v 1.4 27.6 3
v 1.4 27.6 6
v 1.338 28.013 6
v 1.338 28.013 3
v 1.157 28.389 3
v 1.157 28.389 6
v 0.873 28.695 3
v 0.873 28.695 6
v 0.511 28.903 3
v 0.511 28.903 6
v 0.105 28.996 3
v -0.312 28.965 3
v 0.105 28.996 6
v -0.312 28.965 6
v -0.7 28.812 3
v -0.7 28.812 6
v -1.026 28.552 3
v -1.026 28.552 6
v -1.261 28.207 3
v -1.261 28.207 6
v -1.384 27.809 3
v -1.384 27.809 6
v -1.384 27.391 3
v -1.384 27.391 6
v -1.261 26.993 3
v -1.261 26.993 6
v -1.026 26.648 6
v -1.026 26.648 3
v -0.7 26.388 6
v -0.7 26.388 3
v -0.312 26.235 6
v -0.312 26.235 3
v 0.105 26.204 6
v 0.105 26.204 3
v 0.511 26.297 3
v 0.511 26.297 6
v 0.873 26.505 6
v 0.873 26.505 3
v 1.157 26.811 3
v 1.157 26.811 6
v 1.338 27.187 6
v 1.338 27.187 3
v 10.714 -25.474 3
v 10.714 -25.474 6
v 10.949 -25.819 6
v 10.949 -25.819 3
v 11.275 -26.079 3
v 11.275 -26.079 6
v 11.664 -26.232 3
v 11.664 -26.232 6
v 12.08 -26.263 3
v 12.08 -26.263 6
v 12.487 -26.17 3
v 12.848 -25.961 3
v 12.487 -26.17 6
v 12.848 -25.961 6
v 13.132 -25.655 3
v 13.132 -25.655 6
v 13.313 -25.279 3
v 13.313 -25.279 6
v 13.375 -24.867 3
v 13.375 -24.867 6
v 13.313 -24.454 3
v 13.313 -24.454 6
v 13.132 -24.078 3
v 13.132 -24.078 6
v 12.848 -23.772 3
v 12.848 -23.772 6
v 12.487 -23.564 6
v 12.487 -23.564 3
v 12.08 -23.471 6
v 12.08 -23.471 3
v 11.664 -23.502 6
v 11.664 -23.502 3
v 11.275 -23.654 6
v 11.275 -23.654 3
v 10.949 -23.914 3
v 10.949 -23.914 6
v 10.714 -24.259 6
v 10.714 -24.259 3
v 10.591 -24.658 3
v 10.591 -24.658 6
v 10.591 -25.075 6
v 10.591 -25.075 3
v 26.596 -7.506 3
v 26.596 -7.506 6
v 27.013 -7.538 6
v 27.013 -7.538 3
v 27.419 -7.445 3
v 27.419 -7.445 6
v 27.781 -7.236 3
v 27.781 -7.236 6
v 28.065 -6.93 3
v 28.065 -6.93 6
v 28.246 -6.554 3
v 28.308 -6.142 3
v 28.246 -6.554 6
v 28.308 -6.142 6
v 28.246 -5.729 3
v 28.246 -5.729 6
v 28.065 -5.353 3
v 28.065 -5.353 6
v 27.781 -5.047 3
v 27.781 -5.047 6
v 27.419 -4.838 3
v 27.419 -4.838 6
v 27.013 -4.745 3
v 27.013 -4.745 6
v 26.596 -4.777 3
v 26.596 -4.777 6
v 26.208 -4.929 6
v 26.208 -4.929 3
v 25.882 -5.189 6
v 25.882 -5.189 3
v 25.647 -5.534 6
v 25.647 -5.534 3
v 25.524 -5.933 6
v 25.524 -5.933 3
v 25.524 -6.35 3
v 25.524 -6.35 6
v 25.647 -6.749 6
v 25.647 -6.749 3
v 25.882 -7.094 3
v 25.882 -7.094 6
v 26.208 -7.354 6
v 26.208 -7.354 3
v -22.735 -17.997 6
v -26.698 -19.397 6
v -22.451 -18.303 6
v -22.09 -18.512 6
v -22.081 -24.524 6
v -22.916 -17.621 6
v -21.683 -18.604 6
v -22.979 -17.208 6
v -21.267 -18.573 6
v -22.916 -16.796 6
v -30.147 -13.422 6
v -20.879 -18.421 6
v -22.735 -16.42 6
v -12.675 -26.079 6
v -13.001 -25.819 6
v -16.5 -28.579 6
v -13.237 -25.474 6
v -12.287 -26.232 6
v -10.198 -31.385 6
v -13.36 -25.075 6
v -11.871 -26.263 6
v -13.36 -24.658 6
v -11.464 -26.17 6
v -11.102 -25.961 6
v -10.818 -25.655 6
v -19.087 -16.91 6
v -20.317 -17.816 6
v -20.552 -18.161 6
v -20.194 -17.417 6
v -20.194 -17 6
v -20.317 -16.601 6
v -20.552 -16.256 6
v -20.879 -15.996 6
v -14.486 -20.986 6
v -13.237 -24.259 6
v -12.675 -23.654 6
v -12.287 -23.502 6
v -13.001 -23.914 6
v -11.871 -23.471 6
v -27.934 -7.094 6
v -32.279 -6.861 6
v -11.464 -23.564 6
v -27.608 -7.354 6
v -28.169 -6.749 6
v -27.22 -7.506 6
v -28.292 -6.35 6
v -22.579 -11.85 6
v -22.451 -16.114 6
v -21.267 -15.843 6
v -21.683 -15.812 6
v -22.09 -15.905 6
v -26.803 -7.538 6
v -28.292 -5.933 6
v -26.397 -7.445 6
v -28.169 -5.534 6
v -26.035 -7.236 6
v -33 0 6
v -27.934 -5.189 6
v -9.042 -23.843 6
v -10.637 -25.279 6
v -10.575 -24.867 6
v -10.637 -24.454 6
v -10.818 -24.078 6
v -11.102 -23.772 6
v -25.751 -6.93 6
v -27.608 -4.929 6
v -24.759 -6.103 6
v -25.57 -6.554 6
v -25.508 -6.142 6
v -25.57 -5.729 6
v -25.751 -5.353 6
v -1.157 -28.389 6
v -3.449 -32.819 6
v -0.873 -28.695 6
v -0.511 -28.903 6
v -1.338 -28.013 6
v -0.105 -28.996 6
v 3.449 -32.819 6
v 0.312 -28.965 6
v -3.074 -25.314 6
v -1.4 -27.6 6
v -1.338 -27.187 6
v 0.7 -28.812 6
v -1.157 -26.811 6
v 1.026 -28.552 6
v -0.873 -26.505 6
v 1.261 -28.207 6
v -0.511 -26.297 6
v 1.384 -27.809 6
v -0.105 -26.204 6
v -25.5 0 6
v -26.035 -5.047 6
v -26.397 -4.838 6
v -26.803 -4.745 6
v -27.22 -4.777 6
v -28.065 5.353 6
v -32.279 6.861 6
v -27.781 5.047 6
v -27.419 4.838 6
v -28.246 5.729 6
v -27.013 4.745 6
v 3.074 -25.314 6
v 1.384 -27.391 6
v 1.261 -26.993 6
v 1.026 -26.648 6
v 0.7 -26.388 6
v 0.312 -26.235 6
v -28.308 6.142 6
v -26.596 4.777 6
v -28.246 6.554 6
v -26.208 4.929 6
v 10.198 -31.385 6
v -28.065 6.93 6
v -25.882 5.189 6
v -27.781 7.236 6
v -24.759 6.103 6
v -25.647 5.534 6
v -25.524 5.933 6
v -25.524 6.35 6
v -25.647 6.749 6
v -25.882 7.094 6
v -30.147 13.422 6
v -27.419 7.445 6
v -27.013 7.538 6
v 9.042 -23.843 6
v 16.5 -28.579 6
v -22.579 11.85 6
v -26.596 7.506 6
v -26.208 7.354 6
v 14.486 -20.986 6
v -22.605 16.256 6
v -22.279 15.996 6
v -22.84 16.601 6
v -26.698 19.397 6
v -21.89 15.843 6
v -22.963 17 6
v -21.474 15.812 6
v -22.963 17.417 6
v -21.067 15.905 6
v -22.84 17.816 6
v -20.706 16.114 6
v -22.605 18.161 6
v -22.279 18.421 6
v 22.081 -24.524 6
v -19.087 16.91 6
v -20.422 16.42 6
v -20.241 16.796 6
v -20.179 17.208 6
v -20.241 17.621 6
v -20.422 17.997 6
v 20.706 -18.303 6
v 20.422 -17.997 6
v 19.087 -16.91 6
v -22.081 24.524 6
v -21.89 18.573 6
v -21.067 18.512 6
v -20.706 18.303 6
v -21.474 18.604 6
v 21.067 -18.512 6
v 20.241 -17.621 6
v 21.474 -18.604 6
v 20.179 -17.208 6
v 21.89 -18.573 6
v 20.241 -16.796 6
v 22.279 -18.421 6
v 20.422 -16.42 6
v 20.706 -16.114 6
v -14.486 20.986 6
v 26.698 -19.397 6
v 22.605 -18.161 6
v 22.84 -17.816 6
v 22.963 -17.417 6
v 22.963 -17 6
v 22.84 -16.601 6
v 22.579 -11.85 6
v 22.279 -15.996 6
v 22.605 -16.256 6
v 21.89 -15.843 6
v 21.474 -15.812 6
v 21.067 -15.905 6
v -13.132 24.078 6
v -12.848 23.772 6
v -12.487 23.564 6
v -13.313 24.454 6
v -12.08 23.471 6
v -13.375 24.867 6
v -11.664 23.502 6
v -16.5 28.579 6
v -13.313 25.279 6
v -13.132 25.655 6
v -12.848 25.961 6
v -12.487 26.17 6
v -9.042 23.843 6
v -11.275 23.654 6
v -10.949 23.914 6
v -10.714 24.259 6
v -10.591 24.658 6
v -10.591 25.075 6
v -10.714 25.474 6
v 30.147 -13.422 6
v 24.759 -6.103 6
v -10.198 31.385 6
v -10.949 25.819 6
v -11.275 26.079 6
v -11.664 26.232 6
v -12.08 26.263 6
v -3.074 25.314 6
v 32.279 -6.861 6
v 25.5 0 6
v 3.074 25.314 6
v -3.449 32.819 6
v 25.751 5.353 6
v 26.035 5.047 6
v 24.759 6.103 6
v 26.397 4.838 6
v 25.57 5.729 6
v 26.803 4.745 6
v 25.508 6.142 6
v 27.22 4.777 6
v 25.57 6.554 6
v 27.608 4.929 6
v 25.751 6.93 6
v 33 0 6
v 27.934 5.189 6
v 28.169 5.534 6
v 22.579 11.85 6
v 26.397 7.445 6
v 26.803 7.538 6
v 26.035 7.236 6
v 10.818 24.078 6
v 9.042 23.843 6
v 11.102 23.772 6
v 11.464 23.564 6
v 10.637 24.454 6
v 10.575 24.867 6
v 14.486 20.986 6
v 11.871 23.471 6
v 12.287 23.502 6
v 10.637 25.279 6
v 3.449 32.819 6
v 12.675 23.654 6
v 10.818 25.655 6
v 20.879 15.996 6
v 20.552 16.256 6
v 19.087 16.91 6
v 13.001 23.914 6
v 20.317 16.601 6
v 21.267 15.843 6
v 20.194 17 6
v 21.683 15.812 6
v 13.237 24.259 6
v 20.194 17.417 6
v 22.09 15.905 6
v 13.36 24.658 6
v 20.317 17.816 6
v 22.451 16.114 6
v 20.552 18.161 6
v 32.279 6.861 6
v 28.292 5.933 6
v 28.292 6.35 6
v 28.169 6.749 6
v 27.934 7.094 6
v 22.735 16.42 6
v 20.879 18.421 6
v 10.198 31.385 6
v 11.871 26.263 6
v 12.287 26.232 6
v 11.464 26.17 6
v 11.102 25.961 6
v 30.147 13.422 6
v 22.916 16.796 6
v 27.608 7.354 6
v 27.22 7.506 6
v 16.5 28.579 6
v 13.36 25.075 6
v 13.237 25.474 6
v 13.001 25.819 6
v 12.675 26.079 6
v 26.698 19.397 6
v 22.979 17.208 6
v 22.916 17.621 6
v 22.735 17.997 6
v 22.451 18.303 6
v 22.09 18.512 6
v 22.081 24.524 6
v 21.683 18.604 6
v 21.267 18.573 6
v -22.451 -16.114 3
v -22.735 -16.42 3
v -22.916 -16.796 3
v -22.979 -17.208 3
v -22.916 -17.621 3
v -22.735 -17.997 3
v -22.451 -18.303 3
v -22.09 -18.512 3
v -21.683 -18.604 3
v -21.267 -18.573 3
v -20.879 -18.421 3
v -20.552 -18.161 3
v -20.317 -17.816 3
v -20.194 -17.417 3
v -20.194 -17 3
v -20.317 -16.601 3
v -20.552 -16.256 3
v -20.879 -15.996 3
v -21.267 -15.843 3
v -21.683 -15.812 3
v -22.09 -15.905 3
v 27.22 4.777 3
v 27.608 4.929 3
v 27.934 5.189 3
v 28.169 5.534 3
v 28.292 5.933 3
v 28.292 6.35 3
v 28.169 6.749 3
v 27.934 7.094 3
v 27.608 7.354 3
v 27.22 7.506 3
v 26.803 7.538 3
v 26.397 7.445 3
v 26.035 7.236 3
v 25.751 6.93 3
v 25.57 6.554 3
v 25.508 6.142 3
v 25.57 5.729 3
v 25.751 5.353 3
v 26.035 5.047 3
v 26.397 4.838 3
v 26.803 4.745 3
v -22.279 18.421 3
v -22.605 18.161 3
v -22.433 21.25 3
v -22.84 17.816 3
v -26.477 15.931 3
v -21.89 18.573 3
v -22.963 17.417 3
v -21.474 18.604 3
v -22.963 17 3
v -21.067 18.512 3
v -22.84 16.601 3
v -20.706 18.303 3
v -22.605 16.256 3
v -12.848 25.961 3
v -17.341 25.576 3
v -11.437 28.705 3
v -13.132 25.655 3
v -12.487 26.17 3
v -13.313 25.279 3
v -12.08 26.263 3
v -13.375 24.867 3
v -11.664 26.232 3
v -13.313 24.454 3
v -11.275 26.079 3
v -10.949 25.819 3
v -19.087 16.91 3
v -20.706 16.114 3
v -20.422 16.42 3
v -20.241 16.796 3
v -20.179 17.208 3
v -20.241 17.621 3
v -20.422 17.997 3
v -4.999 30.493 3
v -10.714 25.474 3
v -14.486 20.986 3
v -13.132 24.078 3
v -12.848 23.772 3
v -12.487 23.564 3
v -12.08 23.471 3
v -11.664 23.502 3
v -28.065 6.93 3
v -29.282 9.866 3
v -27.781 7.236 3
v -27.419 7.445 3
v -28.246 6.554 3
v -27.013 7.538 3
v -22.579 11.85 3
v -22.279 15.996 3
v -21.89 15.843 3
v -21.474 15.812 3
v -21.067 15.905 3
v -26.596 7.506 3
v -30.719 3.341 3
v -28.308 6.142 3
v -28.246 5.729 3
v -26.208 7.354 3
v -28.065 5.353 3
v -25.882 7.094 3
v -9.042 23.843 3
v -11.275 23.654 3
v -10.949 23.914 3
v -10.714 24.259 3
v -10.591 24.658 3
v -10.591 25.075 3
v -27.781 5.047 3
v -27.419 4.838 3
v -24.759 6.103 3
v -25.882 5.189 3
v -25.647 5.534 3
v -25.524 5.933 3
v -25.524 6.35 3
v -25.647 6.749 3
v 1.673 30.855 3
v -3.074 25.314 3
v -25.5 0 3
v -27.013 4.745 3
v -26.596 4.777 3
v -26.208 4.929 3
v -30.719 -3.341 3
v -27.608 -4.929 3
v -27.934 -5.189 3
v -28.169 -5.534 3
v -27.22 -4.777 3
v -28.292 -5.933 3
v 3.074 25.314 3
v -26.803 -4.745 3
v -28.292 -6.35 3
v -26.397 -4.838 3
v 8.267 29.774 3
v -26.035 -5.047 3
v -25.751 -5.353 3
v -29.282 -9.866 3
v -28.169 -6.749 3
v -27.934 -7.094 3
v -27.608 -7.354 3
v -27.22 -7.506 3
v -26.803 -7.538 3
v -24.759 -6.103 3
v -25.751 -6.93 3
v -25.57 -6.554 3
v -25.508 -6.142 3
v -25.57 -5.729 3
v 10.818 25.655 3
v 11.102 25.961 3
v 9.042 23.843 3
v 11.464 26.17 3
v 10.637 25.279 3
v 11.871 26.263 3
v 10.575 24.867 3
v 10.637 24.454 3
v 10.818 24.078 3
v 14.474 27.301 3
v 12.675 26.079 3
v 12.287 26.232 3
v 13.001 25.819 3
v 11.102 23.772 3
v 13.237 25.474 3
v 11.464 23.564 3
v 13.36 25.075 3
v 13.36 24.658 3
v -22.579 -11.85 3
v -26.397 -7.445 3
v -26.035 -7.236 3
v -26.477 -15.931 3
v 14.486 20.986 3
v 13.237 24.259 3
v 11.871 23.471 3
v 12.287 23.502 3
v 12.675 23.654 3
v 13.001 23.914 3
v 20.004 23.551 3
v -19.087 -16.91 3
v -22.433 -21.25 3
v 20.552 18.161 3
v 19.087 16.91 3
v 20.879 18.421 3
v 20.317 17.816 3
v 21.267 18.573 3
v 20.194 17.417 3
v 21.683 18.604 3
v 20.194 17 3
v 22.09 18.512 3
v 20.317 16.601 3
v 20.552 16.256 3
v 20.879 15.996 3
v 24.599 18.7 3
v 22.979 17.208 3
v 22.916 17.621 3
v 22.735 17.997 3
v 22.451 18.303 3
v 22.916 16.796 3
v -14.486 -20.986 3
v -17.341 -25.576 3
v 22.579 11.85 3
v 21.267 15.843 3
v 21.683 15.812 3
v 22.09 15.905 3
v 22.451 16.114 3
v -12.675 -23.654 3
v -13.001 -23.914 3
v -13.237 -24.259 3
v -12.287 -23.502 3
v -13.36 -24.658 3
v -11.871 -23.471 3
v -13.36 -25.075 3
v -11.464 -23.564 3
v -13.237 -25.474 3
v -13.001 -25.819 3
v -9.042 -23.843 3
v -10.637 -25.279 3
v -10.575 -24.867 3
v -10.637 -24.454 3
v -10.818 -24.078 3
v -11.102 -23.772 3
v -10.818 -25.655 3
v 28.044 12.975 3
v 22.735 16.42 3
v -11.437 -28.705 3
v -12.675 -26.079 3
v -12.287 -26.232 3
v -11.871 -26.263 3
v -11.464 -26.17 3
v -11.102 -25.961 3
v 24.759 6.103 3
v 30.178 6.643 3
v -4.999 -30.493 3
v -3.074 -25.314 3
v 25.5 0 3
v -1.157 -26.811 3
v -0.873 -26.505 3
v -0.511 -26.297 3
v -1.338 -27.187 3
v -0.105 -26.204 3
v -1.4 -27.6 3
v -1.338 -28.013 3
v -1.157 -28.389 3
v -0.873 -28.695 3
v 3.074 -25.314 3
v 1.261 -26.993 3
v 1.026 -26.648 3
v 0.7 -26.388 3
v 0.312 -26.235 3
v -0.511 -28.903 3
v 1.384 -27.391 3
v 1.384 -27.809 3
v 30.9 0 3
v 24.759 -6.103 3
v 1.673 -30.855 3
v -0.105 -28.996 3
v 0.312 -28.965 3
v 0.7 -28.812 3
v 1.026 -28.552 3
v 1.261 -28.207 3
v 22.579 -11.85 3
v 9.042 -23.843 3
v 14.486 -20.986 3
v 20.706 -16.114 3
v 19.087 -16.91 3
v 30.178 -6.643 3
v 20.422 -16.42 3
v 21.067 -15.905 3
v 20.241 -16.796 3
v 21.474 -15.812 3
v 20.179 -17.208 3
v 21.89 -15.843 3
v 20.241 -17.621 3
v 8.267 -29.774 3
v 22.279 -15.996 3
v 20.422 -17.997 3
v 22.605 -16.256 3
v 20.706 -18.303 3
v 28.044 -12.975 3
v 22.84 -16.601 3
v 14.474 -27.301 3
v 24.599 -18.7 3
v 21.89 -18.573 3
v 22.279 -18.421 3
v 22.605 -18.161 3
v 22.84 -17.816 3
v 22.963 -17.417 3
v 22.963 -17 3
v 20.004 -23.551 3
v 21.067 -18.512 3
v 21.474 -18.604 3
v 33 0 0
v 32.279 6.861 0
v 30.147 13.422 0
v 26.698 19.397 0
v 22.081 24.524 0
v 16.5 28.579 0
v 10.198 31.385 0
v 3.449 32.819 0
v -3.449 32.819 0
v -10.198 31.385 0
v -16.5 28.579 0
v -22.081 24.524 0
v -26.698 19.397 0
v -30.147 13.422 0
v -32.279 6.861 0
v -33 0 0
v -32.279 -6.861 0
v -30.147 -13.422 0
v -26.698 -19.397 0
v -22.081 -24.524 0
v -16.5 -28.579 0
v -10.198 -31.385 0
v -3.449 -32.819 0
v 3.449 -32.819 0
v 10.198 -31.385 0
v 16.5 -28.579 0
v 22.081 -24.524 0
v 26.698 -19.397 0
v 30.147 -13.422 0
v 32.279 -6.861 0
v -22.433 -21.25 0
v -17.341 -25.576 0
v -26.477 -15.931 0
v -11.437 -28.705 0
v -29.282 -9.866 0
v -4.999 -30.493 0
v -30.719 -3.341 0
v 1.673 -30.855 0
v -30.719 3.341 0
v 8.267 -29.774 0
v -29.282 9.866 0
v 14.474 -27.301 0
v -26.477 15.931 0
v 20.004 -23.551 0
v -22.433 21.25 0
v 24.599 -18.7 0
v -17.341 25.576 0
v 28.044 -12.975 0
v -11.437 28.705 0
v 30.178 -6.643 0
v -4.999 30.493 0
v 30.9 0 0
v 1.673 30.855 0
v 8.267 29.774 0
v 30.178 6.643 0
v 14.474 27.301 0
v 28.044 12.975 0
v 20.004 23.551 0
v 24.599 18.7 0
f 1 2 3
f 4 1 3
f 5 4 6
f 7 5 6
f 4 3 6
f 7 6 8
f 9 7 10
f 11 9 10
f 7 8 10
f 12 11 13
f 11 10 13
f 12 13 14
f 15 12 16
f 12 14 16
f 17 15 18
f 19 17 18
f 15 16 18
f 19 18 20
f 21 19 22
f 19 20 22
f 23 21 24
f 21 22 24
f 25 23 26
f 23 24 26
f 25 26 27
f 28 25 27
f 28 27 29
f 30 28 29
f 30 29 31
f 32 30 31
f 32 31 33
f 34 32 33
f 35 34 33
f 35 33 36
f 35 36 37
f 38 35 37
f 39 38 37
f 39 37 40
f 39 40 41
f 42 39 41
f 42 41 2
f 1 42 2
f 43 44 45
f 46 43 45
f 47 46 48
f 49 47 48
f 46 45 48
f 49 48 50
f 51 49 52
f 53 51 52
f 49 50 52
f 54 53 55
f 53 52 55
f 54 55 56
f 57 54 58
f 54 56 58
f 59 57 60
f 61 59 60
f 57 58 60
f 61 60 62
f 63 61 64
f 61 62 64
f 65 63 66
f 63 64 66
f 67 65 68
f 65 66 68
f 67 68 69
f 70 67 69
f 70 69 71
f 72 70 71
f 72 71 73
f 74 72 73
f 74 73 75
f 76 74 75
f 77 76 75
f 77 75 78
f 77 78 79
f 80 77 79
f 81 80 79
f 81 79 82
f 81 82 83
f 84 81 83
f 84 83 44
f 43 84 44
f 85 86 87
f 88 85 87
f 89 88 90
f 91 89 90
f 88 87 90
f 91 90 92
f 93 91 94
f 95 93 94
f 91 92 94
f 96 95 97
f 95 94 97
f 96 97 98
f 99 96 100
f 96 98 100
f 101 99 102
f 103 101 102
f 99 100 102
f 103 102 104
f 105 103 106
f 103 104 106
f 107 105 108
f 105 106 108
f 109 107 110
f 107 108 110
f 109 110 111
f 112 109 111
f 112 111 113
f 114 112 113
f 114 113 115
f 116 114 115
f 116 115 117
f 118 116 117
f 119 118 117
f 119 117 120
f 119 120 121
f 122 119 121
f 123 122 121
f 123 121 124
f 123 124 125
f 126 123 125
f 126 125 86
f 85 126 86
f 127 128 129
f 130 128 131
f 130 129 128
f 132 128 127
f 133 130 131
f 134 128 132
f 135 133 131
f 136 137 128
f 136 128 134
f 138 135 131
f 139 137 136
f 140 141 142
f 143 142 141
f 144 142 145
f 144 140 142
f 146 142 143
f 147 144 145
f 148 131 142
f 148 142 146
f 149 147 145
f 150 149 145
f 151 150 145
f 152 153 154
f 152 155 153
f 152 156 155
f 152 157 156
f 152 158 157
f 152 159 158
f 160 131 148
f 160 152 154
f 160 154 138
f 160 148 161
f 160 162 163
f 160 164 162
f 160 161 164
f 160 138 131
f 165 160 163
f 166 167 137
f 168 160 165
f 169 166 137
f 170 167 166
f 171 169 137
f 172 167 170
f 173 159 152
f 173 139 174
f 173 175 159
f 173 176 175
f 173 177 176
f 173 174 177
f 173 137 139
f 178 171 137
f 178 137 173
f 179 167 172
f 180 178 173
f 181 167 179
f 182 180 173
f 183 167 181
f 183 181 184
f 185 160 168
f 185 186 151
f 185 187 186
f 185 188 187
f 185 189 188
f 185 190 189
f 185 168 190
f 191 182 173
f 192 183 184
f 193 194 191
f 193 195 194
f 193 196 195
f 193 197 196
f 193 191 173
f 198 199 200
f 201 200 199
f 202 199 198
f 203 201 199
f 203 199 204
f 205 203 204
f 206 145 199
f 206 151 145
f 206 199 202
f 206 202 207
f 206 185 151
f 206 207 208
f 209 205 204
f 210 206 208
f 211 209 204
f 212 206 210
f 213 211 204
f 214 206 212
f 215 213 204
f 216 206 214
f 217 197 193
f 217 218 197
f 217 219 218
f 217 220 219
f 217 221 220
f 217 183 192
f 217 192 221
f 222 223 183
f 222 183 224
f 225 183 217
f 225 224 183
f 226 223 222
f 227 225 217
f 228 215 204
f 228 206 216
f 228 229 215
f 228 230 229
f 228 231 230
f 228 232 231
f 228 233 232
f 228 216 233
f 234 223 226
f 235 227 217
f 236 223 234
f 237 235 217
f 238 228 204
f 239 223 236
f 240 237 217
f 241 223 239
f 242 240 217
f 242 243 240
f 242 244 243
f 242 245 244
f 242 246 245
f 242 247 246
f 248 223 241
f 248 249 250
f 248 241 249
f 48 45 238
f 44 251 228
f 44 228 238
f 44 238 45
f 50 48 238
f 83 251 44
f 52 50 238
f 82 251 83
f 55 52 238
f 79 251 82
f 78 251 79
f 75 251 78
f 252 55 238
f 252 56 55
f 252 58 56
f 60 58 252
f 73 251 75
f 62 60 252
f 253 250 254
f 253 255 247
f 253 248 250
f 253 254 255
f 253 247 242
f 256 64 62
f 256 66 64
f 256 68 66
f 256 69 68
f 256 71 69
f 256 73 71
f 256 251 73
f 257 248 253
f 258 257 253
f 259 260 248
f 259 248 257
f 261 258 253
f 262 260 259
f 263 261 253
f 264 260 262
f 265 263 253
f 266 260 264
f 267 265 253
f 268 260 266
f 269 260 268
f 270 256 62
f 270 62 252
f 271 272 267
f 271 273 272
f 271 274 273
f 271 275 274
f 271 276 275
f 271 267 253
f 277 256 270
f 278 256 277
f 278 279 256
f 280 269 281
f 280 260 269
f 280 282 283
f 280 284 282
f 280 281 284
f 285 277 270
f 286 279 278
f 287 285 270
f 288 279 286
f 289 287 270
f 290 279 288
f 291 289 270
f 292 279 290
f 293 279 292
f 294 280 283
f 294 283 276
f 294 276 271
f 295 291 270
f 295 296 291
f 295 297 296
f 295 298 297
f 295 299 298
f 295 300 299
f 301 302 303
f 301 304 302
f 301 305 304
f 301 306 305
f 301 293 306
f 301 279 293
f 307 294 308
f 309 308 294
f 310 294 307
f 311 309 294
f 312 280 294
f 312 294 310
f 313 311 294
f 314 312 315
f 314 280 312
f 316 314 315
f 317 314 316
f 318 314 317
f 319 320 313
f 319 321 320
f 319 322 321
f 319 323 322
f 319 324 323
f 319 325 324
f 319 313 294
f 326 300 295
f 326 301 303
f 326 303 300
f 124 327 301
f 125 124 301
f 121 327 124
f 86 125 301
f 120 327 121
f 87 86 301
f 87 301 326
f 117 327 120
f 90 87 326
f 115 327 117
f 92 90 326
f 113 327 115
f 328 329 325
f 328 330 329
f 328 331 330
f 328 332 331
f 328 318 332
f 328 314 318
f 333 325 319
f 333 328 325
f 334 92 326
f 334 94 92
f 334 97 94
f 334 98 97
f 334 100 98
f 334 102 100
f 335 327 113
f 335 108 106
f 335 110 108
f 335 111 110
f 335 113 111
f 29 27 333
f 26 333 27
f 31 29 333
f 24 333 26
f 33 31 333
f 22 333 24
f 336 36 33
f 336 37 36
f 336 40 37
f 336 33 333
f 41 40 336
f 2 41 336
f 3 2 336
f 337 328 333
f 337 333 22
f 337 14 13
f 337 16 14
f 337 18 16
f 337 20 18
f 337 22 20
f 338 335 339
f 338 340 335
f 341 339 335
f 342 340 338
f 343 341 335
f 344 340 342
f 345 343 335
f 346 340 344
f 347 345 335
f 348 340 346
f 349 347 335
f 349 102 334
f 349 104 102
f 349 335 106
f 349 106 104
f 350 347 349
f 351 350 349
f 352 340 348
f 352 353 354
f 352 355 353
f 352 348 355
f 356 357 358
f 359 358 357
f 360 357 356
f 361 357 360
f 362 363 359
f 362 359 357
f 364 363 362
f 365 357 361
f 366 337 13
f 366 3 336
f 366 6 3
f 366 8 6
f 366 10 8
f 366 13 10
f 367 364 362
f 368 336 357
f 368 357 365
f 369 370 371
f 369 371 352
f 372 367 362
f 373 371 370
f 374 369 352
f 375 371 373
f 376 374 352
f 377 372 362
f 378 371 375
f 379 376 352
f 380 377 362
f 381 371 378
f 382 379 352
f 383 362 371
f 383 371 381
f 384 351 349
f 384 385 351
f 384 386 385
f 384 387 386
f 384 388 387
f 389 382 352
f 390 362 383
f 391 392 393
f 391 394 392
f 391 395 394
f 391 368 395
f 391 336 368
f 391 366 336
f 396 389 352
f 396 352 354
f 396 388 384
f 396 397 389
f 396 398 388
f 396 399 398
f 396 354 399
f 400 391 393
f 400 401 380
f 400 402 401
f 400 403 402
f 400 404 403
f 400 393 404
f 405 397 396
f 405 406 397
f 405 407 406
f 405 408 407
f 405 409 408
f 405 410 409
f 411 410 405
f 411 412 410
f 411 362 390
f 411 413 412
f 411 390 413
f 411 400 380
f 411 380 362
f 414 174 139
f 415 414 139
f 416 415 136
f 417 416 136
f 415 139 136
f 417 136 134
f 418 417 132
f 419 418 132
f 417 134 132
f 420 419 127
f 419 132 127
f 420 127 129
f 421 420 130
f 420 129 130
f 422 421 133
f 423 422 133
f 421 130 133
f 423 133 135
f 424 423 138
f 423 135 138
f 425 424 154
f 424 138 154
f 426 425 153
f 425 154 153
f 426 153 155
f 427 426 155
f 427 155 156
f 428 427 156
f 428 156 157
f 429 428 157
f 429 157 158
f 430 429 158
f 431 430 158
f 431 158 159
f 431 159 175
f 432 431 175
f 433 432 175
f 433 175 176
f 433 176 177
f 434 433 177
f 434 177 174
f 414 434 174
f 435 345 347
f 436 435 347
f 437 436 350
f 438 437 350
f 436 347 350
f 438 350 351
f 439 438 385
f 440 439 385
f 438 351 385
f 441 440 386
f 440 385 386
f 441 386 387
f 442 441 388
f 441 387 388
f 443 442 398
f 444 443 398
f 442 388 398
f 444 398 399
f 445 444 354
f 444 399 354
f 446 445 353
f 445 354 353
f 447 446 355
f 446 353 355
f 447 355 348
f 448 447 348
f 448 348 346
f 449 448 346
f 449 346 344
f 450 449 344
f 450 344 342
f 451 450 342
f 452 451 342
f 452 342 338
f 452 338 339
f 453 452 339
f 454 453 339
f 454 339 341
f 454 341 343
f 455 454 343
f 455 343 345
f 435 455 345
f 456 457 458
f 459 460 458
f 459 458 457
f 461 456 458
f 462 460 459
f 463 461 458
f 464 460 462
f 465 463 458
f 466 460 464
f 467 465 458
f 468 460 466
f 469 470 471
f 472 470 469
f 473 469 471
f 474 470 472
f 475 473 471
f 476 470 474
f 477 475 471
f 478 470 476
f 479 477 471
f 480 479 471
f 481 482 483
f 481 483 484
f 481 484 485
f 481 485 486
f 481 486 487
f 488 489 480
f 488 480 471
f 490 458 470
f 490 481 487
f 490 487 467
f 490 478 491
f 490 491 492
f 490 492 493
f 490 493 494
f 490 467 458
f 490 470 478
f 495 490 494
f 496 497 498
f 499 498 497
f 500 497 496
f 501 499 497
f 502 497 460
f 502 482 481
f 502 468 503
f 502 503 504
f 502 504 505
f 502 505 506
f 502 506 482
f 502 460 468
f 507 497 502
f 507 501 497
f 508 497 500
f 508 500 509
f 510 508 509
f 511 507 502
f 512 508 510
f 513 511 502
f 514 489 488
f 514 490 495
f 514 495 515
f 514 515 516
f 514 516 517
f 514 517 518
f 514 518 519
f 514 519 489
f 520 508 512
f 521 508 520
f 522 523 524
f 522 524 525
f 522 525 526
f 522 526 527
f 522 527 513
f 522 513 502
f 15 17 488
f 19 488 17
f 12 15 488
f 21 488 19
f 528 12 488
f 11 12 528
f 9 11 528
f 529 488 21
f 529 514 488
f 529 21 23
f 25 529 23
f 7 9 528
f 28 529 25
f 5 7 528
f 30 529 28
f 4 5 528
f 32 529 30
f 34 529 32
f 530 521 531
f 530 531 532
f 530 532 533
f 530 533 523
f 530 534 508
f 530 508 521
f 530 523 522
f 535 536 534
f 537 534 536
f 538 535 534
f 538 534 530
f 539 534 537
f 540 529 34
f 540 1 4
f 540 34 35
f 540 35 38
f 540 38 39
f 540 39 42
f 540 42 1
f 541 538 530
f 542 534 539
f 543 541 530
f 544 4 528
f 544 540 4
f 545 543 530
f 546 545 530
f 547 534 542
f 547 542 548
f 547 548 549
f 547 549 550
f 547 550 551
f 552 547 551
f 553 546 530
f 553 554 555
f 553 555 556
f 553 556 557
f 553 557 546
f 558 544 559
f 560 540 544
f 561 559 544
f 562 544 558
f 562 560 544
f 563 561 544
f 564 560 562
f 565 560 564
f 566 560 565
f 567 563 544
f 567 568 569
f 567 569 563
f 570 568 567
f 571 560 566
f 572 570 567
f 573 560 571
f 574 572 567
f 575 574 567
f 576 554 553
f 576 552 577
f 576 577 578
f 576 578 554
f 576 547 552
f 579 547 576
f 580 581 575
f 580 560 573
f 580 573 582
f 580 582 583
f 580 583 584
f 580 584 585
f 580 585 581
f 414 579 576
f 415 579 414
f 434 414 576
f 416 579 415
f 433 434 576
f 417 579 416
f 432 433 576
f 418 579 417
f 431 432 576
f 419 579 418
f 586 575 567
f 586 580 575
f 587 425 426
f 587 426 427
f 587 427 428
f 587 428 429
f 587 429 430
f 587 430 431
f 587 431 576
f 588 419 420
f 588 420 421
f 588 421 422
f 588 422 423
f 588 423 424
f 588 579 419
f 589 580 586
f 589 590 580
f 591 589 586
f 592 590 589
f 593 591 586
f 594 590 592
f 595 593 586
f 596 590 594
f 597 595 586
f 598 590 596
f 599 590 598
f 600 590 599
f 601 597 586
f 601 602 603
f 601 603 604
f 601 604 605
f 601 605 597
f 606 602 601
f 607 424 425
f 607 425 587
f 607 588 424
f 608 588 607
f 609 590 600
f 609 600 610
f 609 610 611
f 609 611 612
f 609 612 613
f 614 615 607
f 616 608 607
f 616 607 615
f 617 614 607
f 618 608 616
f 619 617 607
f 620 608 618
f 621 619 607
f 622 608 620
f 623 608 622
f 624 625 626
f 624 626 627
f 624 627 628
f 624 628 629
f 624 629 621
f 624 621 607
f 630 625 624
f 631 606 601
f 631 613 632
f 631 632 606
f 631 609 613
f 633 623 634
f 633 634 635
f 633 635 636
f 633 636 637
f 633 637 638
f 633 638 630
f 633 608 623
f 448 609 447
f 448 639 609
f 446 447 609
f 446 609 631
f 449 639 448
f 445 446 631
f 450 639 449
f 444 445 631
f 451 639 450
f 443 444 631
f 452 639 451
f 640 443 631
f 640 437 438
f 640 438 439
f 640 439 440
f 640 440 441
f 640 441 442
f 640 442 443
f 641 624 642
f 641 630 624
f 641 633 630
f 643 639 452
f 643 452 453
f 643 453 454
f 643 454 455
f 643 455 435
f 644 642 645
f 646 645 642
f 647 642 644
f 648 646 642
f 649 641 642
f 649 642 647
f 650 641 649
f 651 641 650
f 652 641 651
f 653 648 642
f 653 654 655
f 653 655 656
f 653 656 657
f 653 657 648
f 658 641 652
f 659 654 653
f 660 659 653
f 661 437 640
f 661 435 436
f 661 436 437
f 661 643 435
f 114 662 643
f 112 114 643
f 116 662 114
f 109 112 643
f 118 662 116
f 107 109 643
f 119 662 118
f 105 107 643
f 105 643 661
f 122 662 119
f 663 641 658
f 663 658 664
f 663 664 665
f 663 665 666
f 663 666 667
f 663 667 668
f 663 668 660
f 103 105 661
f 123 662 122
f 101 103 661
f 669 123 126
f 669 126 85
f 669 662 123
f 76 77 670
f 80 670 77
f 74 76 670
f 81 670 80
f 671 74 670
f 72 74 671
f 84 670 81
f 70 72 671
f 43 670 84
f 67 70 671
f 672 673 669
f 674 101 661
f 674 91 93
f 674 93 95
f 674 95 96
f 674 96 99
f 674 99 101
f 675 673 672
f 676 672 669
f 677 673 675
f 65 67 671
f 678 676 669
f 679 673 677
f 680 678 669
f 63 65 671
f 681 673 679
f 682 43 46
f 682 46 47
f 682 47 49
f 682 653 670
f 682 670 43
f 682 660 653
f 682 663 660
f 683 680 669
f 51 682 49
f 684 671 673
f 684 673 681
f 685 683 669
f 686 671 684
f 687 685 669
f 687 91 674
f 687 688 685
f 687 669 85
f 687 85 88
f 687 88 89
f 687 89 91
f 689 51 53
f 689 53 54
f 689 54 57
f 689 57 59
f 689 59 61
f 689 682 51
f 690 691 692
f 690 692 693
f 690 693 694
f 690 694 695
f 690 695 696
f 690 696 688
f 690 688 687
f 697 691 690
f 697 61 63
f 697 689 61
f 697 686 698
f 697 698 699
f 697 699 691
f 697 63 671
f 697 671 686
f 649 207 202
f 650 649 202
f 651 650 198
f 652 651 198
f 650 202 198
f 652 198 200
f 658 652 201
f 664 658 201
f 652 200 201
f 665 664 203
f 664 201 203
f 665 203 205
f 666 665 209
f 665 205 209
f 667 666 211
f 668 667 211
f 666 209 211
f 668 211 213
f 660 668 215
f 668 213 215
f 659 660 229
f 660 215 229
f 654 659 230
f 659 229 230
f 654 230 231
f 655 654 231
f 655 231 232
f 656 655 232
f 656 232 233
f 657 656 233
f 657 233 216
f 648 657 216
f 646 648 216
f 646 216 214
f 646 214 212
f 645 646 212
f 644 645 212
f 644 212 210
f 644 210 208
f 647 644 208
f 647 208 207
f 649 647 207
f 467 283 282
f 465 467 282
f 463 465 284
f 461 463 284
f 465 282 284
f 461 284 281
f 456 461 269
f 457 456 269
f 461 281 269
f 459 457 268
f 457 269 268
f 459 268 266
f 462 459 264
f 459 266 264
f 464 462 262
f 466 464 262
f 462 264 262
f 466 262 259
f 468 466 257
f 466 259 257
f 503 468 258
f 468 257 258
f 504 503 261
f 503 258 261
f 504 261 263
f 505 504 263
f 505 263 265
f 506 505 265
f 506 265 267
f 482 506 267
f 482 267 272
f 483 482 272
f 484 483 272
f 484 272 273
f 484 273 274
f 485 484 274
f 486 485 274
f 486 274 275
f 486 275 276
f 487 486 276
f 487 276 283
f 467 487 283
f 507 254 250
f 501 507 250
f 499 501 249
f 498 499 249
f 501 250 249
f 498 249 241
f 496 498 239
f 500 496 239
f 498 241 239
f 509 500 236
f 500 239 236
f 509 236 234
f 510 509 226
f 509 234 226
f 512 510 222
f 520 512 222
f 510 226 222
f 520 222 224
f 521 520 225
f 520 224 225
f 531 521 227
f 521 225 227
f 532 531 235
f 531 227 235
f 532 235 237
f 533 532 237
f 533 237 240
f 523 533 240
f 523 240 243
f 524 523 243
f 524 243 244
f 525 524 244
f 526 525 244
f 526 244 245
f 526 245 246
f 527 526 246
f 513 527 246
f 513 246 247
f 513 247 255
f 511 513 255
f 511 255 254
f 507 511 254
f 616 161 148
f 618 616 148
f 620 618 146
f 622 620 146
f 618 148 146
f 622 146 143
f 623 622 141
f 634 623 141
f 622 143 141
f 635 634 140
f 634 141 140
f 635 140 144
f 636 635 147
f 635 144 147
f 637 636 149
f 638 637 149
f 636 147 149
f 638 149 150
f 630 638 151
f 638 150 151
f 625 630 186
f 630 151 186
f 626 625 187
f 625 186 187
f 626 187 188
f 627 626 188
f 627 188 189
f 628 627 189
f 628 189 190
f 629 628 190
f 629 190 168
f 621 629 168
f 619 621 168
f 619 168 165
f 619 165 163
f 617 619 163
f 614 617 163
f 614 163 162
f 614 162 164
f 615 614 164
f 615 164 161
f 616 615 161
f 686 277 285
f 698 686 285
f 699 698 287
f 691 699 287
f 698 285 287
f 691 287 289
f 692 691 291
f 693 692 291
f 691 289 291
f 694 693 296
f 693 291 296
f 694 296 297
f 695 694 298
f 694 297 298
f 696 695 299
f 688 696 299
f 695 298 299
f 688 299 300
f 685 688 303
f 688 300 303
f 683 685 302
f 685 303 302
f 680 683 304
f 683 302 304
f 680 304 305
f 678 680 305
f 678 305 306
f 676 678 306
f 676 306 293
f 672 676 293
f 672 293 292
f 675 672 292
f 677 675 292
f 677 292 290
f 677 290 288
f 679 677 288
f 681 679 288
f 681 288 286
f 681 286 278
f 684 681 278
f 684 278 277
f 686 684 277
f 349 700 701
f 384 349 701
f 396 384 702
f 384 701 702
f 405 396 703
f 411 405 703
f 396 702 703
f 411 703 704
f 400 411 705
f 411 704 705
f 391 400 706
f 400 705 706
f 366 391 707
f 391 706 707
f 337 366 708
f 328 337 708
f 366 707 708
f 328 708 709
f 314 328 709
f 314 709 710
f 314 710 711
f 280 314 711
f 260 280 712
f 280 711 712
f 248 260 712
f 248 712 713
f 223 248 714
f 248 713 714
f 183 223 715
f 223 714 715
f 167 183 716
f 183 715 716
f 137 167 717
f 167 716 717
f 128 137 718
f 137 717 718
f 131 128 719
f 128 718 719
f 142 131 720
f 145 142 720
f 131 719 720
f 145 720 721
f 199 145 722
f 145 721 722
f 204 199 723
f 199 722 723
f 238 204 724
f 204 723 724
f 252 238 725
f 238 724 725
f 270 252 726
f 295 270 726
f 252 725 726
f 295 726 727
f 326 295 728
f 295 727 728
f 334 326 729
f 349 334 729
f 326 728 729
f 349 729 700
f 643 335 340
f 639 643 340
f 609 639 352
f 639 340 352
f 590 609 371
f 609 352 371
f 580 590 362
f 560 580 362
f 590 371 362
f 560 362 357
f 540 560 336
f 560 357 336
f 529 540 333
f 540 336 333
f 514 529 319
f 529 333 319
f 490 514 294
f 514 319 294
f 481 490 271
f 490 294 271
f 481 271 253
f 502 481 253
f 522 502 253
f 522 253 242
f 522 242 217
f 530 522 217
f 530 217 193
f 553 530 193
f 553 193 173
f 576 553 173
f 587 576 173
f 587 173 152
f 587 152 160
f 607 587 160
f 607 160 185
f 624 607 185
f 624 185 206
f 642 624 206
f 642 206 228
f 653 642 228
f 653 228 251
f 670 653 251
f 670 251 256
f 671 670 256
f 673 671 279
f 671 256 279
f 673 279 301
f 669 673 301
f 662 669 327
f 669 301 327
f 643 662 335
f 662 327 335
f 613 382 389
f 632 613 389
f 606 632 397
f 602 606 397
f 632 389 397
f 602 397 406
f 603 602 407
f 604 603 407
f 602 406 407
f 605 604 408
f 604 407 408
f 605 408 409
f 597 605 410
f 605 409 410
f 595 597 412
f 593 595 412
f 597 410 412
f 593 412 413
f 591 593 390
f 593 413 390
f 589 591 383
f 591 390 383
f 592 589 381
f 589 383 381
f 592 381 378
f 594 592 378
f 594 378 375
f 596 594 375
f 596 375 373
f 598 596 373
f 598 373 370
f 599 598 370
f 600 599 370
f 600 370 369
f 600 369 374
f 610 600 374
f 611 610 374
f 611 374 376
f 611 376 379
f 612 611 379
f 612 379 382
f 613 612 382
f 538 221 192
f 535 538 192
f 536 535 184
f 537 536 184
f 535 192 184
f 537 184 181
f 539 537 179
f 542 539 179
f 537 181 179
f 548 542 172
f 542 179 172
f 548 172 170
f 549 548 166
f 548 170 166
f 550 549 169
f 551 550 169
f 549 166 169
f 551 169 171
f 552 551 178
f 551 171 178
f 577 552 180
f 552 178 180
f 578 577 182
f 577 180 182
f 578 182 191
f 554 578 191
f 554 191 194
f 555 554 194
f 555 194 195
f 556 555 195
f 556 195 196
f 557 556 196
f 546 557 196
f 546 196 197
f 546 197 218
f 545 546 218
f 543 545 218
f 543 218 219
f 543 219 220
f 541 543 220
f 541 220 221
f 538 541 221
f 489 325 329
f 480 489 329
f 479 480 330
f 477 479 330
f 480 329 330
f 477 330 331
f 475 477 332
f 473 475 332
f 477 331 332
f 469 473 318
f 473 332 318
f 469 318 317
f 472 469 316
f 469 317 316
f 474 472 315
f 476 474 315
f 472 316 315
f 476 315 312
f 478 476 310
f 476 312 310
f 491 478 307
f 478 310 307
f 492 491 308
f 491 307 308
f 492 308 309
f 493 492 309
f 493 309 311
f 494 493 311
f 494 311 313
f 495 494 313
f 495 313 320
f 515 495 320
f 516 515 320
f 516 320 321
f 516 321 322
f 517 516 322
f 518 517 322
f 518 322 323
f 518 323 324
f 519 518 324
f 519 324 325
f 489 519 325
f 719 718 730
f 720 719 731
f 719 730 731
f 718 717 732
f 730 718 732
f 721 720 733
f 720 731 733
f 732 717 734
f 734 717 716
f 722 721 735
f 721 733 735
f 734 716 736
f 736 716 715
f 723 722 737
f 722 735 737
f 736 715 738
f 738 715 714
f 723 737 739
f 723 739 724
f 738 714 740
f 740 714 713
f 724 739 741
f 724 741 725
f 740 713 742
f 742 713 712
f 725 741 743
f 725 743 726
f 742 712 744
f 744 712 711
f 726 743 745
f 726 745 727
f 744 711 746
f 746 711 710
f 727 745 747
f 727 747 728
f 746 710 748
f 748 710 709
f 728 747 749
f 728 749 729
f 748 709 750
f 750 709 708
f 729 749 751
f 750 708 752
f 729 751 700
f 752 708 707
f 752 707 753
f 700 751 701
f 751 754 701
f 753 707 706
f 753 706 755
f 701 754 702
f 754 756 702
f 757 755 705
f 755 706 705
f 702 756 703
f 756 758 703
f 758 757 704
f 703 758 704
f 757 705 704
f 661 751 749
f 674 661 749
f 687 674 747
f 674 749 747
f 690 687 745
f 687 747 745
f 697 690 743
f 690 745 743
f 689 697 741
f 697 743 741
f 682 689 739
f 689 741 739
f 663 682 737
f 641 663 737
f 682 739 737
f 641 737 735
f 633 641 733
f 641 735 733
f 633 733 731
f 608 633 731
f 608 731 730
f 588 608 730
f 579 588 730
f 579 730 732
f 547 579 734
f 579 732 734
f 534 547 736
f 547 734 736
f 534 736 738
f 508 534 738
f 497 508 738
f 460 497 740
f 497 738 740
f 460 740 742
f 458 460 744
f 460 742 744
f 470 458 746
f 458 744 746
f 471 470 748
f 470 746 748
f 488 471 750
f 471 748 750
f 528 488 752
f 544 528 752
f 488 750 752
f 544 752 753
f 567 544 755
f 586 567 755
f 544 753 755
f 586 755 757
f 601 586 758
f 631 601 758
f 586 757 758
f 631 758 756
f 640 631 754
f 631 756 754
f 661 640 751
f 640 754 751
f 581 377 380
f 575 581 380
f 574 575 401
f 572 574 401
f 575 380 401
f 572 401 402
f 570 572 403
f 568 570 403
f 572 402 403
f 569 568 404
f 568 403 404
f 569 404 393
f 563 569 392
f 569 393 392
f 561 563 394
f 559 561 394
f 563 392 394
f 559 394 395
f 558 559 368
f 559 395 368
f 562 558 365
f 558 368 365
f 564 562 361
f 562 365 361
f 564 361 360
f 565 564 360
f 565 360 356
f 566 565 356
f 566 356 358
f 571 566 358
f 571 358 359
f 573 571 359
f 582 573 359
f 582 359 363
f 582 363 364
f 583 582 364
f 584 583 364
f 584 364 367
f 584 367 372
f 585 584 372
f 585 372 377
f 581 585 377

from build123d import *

# Parameters (mm, degrees)
SKETCH_R           = 33
PAD_DEPTH          = 6
SKETCH001_R        = 25.5
POCKET_DEPTH       = 6.001
SKETCH002_R        = 1.4
POCKET001_DEPTH    = 193.062487
POLARPATTERN_COUNT = 14
SKETCH004_R        = 30.9
POCKET002_DEPTH    = 3


with BuildPart() as part:
    # Sketch → Pad (new body)
    with BuildSketch(Plane.XY):
        Circle(SKETCH_R)
    extrude(amount=PAD_DEPTH)

    # Sketch001 → Pocket (cut, through all)
    with BuildSketch(Plane.XY.offset(6)):
        Circle(SKETCH001_R)
    extrude(amount=-POCKET_DEPTH, mode=Mode.SUBTRACT)

    # Sketch002 → Pocket001 (cut, through all)
    with BuildSketch(Plane.XY.offset(6)):
        with Locations((0, 27.6)):
            Circle(SKETCH002_R)
    pocket001 = extrude(amount=-POCKET001_DEPTH, mode=Mode.SUBTRACT)

    # PolarPattern: Pocket001 ×14 about axis
    polarpattern_axis = Axis((0, 0, 6), (0, 0, 1))
    for i in range(1, POLARPATTERN_COUNT):
        add(pocket001.rotate(polarpattern_axis, i * 360 / POLARPATTERN_COUNT), mode=Mode.SUBTRACT)

    # Sketch004 → Pocket002 (cut)
    with BuildSketch(Plane(origin=(0, 0, 0), x_dir=(1, 0, 0), z_dir=(0, 0, -1))):
        Circle(SKETCH004_R)
    extrude(amount=-POCKET002_DEPTH, mode=Mode.SUBTRACT)


solid = part.part
